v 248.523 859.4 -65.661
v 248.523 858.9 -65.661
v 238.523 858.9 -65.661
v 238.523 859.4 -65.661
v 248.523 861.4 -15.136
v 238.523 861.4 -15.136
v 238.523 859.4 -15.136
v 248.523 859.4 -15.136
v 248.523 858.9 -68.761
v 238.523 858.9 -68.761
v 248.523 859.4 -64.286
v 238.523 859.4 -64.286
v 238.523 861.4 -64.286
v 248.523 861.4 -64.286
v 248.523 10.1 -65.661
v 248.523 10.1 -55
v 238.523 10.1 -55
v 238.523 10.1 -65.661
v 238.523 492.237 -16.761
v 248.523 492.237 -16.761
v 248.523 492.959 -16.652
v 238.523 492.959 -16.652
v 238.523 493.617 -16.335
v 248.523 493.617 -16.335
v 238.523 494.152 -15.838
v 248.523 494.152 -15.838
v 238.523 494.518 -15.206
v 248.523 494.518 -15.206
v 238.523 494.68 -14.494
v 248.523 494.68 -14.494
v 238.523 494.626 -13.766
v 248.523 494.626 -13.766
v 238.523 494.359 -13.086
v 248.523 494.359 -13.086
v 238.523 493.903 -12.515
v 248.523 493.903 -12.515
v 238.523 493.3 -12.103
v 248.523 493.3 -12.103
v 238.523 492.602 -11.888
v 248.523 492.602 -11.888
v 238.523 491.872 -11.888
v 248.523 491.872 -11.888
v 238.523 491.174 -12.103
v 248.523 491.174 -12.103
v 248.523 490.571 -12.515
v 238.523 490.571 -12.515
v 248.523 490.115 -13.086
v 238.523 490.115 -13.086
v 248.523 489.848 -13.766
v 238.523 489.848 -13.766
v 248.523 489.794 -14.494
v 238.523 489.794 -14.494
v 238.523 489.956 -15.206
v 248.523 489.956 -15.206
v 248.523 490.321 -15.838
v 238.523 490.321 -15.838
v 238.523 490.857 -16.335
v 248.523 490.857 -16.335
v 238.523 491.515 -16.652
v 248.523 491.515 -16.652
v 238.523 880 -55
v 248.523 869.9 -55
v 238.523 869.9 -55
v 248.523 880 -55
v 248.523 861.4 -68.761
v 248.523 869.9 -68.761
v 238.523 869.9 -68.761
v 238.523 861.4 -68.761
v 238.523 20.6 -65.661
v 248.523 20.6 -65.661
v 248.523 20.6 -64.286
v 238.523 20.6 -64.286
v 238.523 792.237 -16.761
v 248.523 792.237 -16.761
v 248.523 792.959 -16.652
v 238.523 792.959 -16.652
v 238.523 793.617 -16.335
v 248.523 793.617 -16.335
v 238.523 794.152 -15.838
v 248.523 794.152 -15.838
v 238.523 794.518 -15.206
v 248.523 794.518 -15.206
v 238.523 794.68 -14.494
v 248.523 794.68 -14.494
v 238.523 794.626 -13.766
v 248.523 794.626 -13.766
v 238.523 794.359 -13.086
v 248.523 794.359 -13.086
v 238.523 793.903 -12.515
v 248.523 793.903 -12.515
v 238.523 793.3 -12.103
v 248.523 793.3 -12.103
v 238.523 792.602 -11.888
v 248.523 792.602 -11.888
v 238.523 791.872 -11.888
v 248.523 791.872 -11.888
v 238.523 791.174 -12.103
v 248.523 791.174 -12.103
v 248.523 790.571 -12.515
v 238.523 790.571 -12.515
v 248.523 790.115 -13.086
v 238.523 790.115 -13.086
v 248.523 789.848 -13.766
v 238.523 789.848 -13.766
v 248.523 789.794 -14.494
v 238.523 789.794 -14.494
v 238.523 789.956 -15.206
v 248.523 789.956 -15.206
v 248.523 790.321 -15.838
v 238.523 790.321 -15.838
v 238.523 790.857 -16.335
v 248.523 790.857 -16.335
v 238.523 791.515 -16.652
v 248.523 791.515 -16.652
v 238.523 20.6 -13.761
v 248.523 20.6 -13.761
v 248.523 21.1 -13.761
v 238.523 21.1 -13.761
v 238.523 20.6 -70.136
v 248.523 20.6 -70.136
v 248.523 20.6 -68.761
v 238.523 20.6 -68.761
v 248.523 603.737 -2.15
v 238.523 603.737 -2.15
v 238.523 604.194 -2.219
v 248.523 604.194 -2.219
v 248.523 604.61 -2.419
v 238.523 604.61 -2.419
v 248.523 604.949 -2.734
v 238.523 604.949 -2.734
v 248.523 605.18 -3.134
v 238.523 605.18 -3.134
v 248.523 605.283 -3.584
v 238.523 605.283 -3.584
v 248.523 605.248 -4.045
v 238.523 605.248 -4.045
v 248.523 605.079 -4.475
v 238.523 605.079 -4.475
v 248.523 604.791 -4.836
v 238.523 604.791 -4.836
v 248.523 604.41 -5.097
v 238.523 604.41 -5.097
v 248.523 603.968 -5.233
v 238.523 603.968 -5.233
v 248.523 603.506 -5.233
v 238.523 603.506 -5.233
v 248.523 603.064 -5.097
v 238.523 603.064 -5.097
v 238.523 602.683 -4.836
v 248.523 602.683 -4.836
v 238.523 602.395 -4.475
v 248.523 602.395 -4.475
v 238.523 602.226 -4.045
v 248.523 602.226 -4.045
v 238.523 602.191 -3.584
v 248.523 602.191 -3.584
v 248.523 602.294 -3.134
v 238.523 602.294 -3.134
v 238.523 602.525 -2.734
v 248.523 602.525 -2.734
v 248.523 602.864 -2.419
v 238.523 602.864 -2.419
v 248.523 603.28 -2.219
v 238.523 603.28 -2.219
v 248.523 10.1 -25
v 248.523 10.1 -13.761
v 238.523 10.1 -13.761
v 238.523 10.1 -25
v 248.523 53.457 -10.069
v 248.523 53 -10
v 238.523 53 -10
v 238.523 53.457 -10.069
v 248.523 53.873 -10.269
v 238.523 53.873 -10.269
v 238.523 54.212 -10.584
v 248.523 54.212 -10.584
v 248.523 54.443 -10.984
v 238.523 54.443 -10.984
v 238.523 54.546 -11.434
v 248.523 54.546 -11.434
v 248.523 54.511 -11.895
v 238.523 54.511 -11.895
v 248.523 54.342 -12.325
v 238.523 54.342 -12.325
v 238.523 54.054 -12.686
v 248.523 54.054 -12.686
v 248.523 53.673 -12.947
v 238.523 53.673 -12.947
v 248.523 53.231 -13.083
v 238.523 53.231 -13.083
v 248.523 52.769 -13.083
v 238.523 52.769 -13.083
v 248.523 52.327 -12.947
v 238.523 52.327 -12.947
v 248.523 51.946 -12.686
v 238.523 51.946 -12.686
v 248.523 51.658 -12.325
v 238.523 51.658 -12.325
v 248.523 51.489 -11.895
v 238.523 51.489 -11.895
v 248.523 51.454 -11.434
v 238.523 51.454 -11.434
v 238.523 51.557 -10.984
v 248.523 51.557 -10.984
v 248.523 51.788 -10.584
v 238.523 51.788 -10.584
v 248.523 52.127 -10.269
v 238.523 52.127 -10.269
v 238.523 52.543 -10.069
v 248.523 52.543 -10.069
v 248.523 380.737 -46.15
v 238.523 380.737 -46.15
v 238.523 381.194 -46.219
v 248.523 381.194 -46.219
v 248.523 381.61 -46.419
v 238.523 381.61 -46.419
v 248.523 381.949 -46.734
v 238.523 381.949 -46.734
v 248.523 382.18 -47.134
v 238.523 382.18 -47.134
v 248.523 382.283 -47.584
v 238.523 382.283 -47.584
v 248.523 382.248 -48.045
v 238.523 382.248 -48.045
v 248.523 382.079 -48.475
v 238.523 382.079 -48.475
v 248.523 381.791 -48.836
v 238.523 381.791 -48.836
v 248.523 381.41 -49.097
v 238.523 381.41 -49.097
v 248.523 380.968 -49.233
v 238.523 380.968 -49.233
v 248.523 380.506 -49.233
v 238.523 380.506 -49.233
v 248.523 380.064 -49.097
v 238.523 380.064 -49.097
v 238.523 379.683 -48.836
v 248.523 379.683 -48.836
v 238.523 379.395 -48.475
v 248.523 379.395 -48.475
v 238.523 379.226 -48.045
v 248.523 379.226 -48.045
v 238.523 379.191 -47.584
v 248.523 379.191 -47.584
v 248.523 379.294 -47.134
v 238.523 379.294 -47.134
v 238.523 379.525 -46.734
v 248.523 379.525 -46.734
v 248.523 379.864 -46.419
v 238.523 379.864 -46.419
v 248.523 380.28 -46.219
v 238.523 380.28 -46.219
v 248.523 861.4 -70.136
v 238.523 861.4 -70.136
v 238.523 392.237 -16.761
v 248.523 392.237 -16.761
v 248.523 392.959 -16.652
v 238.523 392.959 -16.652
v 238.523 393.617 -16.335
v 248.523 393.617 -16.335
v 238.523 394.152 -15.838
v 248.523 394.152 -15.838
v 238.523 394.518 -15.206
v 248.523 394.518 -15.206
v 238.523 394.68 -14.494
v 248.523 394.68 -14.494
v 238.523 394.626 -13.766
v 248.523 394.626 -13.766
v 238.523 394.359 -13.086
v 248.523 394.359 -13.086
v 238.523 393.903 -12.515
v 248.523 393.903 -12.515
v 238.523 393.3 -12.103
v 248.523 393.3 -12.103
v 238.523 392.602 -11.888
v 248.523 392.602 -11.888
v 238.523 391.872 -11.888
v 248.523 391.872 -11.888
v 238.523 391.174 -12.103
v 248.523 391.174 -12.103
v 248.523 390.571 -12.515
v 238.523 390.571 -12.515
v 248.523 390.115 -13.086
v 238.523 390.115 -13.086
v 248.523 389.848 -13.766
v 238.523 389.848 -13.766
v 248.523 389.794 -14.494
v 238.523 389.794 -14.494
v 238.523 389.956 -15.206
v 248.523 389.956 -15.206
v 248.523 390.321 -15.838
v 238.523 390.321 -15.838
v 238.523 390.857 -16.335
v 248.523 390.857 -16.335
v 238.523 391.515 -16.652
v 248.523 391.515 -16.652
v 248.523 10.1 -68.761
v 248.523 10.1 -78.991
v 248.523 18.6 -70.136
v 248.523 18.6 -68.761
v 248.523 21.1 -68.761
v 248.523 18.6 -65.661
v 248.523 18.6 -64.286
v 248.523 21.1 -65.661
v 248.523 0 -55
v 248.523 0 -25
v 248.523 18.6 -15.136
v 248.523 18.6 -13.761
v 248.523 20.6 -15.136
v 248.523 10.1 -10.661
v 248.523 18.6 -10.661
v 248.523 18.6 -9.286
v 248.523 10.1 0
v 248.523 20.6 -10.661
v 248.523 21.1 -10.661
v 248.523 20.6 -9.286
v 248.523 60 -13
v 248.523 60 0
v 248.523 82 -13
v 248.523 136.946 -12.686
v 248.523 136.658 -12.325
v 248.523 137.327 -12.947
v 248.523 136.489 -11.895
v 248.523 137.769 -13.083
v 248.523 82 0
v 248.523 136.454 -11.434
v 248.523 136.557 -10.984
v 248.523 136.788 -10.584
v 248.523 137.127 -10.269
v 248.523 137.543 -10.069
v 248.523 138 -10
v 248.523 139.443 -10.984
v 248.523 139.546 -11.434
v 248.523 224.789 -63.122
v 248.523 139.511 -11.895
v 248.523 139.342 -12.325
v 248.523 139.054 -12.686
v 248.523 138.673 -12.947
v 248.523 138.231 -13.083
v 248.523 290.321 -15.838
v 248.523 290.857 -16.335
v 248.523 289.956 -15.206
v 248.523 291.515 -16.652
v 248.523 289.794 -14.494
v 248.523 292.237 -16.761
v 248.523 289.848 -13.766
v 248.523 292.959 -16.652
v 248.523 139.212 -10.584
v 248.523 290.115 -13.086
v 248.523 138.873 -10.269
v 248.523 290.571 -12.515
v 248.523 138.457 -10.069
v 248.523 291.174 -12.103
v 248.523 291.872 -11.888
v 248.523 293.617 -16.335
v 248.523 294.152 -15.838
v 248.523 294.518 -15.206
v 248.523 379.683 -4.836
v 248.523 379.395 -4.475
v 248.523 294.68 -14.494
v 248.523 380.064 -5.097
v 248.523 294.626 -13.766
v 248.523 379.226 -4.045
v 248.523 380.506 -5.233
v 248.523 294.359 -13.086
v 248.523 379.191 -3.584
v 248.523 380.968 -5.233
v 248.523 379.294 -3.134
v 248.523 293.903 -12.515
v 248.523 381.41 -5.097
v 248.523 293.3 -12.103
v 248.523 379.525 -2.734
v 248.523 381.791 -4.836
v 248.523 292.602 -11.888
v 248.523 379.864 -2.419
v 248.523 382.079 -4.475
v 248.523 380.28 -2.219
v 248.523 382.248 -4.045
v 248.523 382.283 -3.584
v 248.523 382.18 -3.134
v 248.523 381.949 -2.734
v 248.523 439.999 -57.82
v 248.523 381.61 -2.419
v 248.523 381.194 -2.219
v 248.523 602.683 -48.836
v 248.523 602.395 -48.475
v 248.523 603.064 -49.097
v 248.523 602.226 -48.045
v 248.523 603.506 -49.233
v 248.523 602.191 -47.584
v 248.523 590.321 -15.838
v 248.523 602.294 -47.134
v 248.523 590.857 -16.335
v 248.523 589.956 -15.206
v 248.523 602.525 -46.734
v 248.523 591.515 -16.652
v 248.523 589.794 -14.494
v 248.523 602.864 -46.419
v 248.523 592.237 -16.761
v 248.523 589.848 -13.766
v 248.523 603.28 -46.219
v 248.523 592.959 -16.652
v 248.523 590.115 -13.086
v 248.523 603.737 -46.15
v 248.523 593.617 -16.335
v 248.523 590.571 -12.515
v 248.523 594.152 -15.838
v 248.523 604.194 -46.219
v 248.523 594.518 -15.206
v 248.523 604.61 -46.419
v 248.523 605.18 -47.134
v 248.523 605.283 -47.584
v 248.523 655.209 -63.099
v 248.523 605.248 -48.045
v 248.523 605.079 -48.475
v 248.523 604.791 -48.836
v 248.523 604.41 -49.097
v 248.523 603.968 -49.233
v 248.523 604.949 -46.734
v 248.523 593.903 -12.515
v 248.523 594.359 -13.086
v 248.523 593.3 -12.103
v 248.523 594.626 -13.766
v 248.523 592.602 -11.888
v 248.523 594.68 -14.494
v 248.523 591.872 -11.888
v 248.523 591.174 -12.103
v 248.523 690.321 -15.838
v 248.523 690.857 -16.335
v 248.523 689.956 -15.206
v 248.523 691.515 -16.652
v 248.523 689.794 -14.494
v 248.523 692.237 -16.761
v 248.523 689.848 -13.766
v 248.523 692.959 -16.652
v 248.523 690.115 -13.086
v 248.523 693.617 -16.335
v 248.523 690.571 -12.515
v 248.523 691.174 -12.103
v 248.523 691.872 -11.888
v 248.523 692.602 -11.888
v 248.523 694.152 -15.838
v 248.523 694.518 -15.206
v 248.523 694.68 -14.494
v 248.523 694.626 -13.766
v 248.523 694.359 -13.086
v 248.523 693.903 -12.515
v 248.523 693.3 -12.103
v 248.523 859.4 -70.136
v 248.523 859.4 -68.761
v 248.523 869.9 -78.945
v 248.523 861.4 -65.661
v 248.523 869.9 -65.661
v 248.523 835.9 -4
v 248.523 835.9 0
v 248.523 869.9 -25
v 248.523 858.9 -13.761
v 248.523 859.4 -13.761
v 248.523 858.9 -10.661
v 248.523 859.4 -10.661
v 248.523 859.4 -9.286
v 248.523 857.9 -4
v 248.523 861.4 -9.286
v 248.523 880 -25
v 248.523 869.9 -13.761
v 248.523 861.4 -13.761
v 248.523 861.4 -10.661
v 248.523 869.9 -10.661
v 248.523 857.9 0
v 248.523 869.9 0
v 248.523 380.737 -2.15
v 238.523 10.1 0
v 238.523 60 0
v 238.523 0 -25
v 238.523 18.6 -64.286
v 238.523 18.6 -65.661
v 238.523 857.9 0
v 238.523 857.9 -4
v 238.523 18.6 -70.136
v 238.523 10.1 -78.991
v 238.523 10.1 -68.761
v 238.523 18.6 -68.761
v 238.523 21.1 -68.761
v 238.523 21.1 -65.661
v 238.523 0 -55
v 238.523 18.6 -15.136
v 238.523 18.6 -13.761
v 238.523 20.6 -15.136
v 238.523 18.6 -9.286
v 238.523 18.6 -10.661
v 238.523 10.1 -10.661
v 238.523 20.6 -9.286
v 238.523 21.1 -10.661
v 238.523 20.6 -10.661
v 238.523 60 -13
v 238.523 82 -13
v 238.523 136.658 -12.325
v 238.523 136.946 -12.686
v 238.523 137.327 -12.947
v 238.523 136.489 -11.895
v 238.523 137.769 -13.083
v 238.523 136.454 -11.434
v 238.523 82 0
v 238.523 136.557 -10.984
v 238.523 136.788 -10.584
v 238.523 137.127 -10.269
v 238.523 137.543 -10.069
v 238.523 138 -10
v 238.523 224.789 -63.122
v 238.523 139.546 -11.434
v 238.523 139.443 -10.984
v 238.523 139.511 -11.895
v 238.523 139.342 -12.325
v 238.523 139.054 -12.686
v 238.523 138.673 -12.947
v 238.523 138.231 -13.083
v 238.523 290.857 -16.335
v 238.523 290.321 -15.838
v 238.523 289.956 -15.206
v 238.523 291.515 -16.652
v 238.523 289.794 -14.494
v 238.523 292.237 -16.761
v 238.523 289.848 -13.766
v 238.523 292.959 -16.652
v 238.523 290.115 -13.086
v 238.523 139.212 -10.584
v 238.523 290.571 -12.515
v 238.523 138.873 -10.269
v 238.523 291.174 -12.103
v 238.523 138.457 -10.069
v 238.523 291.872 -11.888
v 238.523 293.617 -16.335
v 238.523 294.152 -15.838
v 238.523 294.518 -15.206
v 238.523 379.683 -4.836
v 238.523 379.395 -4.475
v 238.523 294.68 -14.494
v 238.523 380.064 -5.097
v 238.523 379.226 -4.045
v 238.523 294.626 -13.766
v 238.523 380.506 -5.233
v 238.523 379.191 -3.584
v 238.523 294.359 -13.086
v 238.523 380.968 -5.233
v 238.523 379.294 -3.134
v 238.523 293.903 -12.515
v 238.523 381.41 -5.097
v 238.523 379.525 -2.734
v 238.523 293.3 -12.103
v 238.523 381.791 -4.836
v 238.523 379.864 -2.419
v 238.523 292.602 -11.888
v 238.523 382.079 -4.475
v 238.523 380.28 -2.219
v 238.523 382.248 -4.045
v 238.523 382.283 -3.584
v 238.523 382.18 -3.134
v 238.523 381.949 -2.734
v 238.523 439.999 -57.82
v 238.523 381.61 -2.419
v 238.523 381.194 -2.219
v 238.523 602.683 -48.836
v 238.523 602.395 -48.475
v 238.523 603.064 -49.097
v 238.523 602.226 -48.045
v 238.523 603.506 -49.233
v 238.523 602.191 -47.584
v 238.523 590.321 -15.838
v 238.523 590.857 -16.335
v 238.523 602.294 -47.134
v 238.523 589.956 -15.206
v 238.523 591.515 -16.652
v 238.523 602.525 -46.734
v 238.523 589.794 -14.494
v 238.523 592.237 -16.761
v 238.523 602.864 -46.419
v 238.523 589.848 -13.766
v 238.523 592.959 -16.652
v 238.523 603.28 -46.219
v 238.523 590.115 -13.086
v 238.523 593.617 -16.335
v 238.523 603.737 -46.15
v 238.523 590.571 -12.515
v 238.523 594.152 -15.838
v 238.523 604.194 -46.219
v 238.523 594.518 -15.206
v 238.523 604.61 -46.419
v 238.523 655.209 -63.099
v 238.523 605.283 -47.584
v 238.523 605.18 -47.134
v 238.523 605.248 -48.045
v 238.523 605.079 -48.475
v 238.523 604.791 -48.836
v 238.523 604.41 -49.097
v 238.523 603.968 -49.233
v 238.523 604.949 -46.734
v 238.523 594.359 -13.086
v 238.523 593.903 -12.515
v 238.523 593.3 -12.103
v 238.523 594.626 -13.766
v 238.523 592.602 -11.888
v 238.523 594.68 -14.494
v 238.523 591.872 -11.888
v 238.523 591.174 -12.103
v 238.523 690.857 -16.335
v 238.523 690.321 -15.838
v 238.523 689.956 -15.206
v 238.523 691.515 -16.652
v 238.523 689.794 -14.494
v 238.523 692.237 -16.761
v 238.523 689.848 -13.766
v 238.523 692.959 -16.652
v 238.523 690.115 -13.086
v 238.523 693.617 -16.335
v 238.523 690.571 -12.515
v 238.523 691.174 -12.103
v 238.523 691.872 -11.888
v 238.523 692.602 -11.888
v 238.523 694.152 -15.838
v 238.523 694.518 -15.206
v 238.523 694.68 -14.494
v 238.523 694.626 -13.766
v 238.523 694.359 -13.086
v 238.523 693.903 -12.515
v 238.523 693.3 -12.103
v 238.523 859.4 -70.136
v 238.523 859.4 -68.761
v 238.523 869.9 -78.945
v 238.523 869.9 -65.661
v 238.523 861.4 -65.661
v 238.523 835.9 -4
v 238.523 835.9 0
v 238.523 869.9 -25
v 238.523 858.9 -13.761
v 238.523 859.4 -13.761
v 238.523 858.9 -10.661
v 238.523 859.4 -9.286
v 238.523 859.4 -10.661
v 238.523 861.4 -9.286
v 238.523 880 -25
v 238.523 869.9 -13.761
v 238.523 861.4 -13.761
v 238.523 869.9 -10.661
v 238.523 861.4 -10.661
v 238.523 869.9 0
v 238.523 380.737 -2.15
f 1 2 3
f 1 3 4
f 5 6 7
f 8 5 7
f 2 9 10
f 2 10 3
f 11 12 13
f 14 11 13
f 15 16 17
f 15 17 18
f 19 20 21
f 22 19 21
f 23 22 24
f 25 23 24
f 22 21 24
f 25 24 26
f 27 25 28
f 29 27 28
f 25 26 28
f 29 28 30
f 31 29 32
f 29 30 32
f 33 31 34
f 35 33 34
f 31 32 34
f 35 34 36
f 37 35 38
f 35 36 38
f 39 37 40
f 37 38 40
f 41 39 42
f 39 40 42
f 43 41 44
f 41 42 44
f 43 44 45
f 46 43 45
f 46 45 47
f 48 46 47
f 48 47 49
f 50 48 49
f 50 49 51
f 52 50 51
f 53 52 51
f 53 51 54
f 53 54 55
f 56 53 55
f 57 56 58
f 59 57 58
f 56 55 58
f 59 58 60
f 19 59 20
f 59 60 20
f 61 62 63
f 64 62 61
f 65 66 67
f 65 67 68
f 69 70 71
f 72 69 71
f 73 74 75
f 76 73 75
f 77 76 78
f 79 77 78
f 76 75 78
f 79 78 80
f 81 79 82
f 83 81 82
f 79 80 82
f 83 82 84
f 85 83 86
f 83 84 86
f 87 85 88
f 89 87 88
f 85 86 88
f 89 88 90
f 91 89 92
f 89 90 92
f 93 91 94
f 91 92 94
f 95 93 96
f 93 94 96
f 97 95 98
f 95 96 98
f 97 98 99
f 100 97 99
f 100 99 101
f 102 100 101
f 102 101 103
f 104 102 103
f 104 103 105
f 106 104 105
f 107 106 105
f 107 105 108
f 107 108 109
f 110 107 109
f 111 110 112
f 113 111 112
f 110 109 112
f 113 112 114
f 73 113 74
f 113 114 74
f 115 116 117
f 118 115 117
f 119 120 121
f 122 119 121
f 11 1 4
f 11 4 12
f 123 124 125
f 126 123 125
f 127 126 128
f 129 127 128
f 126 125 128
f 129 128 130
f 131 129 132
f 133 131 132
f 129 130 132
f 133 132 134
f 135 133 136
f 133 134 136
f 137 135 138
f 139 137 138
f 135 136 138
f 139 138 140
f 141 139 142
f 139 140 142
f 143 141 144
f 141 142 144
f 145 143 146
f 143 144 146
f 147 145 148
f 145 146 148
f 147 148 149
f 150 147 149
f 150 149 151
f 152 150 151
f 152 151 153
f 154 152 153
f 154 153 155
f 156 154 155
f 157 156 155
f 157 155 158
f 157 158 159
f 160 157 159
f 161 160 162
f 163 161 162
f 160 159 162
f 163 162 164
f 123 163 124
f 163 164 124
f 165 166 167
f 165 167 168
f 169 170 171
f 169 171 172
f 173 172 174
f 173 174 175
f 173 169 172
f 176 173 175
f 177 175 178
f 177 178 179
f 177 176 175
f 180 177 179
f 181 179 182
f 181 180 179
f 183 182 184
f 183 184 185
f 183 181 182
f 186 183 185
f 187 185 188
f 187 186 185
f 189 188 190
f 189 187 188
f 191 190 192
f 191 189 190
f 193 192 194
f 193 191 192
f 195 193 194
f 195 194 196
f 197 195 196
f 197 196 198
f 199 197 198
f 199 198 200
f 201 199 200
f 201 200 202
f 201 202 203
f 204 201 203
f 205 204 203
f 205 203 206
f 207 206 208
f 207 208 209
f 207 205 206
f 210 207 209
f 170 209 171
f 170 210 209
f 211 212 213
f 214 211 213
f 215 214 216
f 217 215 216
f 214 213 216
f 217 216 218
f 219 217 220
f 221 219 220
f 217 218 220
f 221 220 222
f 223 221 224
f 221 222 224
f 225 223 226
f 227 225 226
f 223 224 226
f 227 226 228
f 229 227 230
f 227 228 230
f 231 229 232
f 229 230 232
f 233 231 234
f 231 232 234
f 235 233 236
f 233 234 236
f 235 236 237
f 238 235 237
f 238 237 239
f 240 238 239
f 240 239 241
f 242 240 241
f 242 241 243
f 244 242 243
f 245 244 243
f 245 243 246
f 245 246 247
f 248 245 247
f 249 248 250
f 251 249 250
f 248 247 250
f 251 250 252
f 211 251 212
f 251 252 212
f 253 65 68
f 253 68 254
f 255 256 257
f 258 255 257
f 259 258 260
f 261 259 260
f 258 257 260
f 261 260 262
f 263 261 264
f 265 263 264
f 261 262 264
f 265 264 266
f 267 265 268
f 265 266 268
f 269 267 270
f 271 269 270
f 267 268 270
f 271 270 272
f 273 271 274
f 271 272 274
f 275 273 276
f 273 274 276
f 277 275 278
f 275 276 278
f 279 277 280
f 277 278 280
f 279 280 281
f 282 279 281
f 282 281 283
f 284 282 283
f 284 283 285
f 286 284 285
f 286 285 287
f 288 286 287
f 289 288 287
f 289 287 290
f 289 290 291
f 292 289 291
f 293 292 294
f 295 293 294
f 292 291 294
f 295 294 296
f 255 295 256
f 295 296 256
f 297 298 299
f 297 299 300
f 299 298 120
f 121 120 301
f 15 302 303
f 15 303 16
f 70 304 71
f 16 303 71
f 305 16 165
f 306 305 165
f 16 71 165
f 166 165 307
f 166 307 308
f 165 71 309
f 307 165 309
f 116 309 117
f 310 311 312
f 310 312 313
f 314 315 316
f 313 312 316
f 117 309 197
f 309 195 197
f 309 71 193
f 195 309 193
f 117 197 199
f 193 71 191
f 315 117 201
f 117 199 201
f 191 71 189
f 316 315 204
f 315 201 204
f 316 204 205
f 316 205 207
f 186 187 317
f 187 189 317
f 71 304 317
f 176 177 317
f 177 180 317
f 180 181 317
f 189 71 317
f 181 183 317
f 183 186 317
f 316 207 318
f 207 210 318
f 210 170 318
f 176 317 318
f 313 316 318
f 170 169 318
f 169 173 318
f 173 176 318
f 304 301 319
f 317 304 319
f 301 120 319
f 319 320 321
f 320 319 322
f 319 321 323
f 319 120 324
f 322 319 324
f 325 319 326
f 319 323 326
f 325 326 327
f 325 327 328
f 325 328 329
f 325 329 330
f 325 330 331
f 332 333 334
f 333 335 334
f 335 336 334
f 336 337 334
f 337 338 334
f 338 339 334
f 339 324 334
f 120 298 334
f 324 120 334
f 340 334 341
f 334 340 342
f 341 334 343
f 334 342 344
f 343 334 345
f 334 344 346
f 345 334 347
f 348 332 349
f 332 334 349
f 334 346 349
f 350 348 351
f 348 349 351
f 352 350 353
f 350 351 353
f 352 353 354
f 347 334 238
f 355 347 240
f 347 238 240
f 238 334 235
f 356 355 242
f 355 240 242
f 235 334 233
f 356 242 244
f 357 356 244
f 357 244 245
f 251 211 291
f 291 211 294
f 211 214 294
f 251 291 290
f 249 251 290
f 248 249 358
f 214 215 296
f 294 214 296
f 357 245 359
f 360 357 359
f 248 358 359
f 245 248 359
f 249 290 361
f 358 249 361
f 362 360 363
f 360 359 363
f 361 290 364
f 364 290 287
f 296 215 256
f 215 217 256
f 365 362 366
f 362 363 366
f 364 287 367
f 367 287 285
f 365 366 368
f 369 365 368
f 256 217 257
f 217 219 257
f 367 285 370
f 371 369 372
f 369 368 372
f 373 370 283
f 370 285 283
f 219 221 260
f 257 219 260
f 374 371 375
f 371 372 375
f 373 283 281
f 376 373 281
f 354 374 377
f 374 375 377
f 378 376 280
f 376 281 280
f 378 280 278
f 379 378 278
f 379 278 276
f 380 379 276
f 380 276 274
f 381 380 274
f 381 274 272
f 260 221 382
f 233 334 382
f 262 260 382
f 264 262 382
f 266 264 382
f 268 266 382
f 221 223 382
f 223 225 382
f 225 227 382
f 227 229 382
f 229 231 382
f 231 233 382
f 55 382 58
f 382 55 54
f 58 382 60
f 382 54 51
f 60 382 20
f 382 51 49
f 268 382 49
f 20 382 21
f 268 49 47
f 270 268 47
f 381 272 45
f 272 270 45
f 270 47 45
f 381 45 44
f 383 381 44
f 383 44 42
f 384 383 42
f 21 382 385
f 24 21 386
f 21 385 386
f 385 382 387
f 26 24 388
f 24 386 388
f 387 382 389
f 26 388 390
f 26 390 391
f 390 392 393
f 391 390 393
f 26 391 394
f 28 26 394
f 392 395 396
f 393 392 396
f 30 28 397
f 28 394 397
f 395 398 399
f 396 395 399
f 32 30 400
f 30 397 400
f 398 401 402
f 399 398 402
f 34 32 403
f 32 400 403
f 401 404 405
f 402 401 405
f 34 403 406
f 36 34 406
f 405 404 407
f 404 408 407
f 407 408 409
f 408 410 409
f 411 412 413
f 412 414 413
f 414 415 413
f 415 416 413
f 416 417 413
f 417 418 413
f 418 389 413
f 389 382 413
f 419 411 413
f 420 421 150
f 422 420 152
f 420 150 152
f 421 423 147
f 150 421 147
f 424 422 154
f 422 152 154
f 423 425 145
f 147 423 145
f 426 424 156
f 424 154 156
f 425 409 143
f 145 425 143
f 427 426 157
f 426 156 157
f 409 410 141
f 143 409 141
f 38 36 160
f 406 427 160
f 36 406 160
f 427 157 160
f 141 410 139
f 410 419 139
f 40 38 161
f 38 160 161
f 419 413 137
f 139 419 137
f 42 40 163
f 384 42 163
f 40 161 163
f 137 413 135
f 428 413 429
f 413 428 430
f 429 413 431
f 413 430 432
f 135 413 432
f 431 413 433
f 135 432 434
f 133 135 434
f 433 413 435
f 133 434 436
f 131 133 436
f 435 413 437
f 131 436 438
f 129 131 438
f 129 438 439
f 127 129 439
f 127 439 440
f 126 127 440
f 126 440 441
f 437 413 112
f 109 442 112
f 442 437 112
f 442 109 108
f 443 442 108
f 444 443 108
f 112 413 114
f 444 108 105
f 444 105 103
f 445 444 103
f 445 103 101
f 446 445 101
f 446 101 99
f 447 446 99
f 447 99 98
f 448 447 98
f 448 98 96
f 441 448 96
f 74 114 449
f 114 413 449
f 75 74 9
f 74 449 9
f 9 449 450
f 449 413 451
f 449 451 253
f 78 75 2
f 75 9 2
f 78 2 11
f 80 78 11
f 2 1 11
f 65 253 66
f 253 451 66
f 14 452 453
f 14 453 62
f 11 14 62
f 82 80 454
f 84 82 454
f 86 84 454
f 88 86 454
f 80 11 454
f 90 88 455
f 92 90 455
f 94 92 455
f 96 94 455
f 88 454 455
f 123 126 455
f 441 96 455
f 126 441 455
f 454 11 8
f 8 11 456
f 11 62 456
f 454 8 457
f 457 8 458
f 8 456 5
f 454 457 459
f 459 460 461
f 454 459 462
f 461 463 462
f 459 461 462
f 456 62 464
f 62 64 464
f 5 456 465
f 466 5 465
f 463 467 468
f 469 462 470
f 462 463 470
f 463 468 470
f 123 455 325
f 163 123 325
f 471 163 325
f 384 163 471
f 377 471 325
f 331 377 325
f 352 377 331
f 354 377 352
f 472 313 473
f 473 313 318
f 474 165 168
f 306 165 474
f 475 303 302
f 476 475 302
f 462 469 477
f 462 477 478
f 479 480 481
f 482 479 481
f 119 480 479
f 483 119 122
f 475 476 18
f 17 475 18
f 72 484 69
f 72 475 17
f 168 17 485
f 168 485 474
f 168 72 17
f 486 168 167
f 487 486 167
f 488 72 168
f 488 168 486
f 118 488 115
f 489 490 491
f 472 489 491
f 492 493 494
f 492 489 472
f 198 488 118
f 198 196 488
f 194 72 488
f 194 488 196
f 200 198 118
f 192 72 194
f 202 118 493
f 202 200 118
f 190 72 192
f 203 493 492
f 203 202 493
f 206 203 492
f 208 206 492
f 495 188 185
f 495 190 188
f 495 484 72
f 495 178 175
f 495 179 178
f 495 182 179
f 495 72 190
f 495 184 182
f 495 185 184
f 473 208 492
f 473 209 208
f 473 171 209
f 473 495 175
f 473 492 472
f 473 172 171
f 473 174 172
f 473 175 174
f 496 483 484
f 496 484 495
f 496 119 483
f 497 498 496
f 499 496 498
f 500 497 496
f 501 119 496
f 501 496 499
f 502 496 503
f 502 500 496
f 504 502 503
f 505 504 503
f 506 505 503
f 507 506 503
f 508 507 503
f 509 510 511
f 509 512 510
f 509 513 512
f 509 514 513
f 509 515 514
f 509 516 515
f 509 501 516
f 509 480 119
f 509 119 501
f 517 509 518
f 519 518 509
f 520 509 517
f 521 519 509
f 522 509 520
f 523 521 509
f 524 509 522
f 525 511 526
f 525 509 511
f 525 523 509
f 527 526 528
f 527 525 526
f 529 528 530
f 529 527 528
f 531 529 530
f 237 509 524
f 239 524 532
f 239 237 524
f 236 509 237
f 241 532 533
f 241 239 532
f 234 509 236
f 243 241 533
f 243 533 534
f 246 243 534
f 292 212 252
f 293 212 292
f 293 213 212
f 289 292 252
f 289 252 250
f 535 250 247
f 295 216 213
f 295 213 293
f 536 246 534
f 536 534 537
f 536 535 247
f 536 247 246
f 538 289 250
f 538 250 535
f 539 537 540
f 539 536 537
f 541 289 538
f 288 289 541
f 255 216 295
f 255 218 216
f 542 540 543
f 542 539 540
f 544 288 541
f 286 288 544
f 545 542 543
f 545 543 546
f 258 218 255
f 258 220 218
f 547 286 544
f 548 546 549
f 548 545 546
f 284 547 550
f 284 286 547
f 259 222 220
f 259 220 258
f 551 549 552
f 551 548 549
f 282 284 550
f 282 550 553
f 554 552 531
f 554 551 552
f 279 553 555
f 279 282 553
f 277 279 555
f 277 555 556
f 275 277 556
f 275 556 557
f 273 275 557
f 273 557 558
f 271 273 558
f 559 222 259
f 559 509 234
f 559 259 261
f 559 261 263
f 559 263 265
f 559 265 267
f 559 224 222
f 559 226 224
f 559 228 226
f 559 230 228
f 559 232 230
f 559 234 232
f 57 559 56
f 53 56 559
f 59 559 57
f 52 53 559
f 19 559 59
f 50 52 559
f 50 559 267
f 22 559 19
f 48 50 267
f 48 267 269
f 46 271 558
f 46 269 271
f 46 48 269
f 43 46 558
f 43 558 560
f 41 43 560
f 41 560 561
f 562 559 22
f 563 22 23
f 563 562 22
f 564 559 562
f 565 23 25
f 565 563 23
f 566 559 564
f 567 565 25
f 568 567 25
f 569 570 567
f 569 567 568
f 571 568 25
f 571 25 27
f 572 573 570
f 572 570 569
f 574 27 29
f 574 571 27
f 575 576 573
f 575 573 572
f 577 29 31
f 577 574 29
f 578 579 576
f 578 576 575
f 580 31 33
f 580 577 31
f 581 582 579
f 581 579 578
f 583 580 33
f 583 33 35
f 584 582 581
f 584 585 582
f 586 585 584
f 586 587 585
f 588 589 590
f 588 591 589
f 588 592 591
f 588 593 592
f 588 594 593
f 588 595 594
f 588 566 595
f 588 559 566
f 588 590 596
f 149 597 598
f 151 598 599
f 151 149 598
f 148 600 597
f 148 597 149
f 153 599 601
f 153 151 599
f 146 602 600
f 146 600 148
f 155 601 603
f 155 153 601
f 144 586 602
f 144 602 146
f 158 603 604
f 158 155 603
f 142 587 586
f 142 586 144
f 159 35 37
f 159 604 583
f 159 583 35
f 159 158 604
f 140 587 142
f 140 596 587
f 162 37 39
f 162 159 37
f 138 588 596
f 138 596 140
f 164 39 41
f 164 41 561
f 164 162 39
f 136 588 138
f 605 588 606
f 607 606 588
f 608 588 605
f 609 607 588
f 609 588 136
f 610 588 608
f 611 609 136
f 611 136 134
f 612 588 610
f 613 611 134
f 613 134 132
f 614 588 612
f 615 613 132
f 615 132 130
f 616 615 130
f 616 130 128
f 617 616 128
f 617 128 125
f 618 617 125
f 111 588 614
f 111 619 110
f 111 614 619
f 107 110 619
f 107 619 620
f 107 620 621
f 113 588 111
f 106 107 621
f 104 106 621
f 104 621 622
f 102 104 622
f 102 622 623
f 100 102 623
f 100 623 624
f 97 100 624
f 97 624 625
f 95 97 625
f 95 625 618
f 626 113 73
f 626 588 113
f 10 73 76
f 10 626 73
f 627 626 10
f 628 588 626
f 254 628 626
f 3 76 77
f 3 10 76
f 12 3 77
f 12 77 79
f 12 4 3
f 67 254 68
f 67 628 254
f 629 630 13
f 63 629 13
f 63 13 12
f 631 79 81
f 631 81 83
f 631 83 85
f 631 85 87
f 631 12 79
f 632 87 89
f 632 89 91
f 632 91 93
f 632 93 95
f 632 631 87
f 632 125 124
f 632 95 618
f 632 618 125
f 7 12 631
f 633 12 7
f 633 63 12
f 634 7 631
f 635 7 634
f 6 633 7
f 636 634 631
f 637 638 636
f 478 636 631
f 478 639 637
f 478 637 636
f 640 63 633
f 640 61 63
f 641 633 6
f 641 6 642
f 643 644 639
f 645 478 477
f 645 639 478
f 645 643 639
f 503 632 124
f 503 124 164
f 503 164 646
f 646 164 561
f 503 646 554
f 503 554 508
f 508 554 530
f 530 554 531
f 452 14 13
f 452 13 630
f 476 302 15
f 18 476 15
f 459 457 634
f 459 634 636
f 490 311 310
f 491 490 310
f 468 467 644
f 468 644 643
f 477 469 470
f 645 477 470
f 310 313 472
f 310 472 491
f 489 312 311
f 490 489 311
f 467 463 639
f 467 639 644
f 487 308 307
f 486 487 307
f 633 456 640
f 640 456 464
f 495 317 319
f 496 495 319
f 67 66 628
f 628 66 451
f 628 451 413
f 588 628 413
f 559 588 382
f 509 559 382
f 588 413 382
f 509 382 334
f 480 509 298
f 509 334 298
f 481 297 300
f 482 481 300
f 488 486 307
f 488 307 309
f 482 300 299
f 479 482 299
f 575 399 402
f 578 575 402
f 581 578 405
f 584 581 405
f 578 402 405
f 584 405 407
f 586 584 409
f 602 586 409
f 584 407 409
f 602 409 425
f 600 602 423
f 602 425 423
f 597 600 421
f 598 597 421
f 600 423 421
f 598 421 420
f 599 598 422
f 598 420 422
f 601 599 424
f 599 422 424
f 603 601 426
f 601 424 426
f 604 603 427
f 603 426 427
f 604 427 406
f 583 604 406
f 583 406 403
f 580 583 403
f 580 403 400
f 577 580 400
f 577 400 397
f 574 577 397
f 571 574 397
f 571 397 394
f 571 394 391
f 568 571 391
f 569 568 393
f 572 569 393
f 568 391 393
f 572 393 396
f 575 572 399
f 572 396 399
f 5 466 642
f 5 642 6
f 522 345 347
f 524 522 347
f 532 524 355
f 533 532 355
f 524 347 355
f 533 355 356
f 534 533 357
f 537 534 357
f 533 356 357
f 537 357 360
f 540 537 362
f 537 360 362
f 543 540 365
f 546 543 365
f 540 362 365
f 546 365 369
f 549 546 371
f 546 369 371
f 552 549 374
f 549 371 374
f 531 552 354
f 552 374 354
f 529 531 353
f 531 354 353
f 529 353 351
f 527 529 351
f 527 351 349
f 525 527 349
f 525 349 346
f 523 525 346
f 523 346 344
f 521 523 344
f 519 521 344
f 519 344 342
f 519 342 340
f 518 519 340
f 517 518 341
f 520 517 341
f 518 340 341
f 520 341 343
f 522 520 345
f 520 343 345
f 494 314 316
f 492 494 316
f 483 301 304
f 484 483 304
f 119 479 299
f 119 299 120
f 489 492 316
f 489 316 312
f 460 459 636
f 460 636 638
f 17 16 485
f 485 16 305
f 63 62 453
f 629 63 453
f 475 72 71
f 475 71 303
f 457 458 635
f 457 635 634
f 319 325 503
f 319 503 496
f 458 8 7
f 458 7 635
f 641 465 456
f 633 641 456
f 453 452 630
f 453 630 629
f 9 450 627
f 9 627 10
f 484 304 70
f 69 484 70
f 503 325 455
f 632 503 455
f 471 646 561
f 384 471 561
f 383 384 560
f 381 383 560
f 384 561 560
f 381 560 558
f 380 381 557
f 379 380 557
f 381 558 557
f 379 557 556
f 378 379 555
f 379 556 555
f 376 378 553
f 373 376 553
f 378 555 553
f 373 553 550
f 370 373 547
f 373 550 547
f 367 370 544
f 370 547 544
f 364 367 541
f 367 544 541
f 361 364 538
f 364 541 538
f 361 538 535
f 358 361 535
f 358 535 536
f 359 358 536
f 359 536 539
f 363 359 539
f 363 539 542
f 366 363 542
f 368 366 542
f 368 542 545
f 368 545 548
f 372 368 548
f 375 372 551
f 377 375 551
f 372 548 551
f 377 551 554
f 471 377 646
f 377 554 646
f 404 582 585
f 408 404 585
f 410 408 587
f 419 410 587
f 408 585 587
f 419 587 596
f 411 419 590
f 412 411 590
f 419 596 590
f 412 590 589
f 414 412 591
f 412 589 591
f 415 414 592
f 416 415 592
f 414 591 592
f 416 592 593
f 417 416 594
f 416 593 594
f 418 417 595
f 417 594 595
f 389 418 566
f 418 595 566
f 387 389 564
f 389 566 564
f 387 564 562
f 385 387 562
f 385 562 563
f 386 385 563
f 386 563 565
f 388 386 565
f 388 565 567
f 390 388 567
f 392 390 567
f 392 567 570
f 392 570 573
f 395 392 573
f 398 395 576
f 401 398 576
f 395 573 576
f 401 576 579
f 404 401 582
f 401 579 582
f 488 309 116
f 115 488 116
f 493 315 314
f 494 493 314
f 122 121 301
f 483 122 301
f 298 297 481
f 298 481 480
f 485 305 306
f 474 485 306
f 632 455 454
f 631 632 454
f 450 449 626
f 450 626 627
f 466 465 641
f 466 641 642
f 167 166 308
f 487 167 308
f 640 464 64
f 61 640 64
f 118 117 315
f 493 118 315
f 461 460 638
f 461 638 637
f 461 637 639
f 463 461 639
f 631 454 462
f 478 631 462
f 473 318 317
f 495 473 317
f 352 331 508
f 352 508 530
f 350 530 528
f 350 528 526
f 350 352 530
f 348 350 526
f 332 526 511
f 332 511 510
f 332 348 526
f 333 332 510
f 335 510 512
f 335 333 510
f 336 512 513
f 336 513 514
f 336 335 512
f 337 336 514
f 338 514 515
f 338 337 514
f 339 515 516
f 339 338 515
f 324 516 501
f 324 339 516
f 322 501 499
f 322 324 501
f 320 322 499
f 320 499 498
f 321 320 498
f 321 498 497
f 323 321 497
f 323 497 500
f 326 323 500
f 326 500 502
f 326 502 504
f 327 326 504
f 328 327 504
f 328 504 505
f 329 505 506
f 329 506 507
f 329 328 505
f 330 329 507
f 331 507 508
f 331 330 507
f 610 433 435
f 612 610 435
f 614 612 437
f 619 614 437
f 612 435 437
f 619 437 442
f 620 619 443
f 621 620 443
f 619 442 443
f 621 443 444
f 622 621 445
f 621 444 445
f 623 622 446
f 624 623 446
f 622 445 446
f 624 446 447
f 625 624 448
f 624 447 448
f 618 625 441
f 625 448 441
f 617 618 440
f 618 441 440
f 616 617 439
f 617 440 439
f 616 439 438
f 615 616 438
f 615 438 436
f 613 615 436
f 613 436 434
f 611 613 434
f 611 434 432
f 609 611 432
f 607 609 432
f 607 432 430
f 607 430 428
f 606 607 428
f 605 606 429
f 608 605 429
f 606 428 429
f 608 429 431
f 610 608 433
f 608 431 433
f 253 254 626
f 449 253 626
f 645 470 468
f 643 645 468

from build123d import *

# Parameters (mm, degrees)
DODANIE_WYCI_GNI_CIE1_DEPTH = 10
SZKIC1_W                    = 30
SZKIC1_H                    = 10.1
SZKIC1_W_2                  = 25
WYTNIJ_WYCI_GNI_CIE1_DEPTH  = 10
WYTNIJ_WYCI_GNI_CIE2_DEPTH  = 10
SZYK_LINIOWY1_COUNT         = 2
SZYK_LINIOWY1_PITCH         = 55
SZKIC5_R                    = 1.55
WYTNIJ_WYCI_GNI_CIE3_DEPTH  = 10
SZKIC7_R                    = 2.45
WYTNIJ_WYCI_GNI_CIE5_DEPTH  = 10
SZYK_LINIOWY3_COUNT         = 6
SZYK_LINIOWY3_PITCH         = 100
SZKIC8_W                    = 13
SZKIC8_H                    = 22
WYTNIJ_WYCI_GNI_CIE6_DEPTH  = 10
SZKIC9_W                    = 4
SZKIC9_H                    = 22
WYTNIJ_WYCI_GNI_CIE7_DEPTH  = 10
LUSTRO1_COPY_1_DEPTH        = 10
SZKIC12_R                   = 1.55
WYTNIJ_WYCI_GNI_CIE8_DEPTH  = 10
SZYK_LINIOWY4_COUNT         = 2
SZYK_LINIOWY4_PITCH         = 223


with BuildPart() as part:
    # Szkic11 → Dodanie-wyciągnięcie1 (new body)
    with BuildSketch(Plane.ZY.offset(-248.52281754)):
        with BuildLine():
            Line((-79.001367167, 0), (0, 0))
            Line((0, 0), (0, 880))
            Line((0, 880), (-78.955177412, 880))
            Line((-78.955177412, 880), (-78.955177412, 870))
            ThreePointArc((-78.955177412, 870), (-57.819766969, 439.998863597), (-79.001367167, 10))
            Line((-79.001367167, 10), (-79.001367167, 0))
        make_face()
    extrude(amount=DODANIE_WYCI_GNI_CIE1_DEPTH)

    # Szkic1 → Wytnij-wyciągnięcie1 (cut)
    with BuildSketch(Plane(origin=(248.52281754, 0, 0), x_dir=(0, 0, -1), z_dir=(1, 0, 0))):
        with Locations((70, 874.95)):
            Rectangle(SZKIC1_W, SZKIC1_H)
        with Locations((12.5, 874.95)):
            Rectangle(SZKIC1_W_2, SZKIC1_H)
    wytnij_wyci_gni_cie1 = extrude(amount=-WYTNIJ_WYCI_GNI_CIE1_DEPTH, mode=Mode.SUBTRACT)

    # Szkic2 → Wytnij-wyciągnięcie2 (cut)
    with BuildSketch(Plane(origin=(248.52281754, 0, 0), x_dir=(0, 0, -1), z_dir=(1, 0, 0))):
        Polygon((10.660920663, 869.9), (13.760920663, 869.9), (13.760920663, 861.4), (15.135920663, 861.4), (15.135920663, 859.4), (13.760920663, 859.4), (13.760920663, 858.9), (10.660920663, 858.9), (10.660920663, 859.4), (9.285920663, 859.4), (9.285920663, 861.4), (10.660920663, 861.4), align=None)
    wytnij_wyci_gni_cie2 = extrude(amount=-WYTNIJ_WYCI_GNI_CIE2_DEPTH, mode=Mode.SUBTRACT)

    # Szyk liniowy1: Wytnij-wyciągnięcie2 ×2
    with Locations(*[(0, 0, -i * SZYK_LINIOWY1_PITCH) for i in range(1, SZYK_LINIOWY1_COUNT)]):
        add(wytnij_wyci_gni_cie2, mode=Mode.SUBTRACT)

    # Szkic5 → Wytnij-wyciągnięcie3 (cut)
    with BuildSketch(Plane.ZY.offset(-248.52281754)):
        with Locations((-11.55, 53)):
            Circle(SZKIC5_R)
        with Locations((-11.55, 138)):
            Circle(SZKIC5_R)
    extrude(amount=WYTNIJ_WYCI_GNI_CIE3_DEPTH, mode=Mode.SUBTRACT)

    # Szkic7 → Wytnij-wyciągnięcie5 (cut)
    with BuildSketch(Plane(origin=(248.52281754, 0, 0), x_dir=(0, 0, -1), z_dir=(1, 0, 0))):
        with Locations((14.31069395, 792.236985413)):
            Circle(SZKIC7_R)
    wytnij_wyci_gni_cie5 = extrude(amount=-WYTNIJ_WYCI_GNI_CIE5_DEPTH, mode=Mode.SUBTRACT)

    # Szyk liniowy3: Wytnij-wyciągnięcie5 ×6
    with Locations(*[(0, -i * SZYK_LINIOWY3_PITCH, 0) for i in range(1, SZYK_LINIOWY3_COUNT)]):
        add(wytnij_wyci_gni_cie5, mode=Mode.SUBTRACT)

    # Szkic8 → Wytnij-wyciągnięcie6 (cut)
    with BuildSketch(Plane(origin=(248.52281754, 0, 0), x_dir=(0, 0, -1), z_dir=(1, 0, 0))):
        with Locations((6.5, 71)):
            Rectangle(SZKIC8_W, SZKIC8_H)
    extrude(amount=-WYTNIJ_WYCI_GNI_CIE6_DEPTH, mode=Mode.SUBTRACT)

    # Szkic9 → Wytnij-wyciągnięcie7 (cut)
    with BuildSketch(Plane(origin=(248.52281754, 0, 0), x_dir=(0, 0, -1), z_dir=(1, 0, 0))):
        with Locations((2, 846.9)):
            Rectangle(SZKIC9_W, SZKIC9_H)
    extrude(amount=-WYTNIJ_WYCI_GNI_CIE7_DEPTH, mode=Mode.SUBTRACT)

    # Lustro1: Wytnij-wyciągnięcie1, Wytnij-wyciągnięcie2 across plane
    add(wytnij_wyci_gni_cie1.mirror(Plane.ZX.offset(440)), mode=Mode.SUBTRACT)
    add(wytnij_wyci_gni_cie2.mirror(Plane.ZX.offset(440)), mode=Mode.SUBTRACT)

    # Lustro1 copy 1 sketch → Lustro1 copy 1 (cut)
    with BuildSketch(Plane(origin=(248.52281754, 880, -55), x_dir=(0, 0, -1), z_dir=(1, 0, 0))):
        Polygon((10.660920663, -869.9), (13.760920663, -869.9), (13.760920663, -861.4), (15.135920663, -861.4), (15.135920663, -859.4), (13.760920663, -859.4), (13.760920663, -858.9), (10.660920663, -858.9), (10.660920663, -859.4), (9.285920663, -859.4), (9.285920663, -861.4), (10.660920663, -861.4), align=None)
    extrude(amount=-LUSTRO1_COPY_1_DEPTH, mode=Mode.SUBTRACT)

    # Szkic12 → Wytnij-wyciągnięcie8 (cut)
    with BuildSketch(Plane.ZY.offset(-238.52281754)):
        with Locations((-47.7, 603.736985413)):
            Circle(SZKIC12_R)
        with Locations((-3.7, 603.736985413)):
            Circle(SZKIC12_R)
    wytnij_wyci_gni_cie8 = extrude(amount=-WYTNIJ_WYCI_GNI_CIE8_DEPTH, mode=Mode.SUBTRACT)

    # Szyk liniowy4: Wytnij-wyciągnięcie8 ×2
    with Locations(*[(0, -i * SZYK_LINIOWY4_PITCH, 0) for i in range(1, SZYK_LINIOWY4_COUNT)]):
        add(wytnij_wyci_gni_cie8, mode=Mode.SUBTRACT)


solid = part.part
